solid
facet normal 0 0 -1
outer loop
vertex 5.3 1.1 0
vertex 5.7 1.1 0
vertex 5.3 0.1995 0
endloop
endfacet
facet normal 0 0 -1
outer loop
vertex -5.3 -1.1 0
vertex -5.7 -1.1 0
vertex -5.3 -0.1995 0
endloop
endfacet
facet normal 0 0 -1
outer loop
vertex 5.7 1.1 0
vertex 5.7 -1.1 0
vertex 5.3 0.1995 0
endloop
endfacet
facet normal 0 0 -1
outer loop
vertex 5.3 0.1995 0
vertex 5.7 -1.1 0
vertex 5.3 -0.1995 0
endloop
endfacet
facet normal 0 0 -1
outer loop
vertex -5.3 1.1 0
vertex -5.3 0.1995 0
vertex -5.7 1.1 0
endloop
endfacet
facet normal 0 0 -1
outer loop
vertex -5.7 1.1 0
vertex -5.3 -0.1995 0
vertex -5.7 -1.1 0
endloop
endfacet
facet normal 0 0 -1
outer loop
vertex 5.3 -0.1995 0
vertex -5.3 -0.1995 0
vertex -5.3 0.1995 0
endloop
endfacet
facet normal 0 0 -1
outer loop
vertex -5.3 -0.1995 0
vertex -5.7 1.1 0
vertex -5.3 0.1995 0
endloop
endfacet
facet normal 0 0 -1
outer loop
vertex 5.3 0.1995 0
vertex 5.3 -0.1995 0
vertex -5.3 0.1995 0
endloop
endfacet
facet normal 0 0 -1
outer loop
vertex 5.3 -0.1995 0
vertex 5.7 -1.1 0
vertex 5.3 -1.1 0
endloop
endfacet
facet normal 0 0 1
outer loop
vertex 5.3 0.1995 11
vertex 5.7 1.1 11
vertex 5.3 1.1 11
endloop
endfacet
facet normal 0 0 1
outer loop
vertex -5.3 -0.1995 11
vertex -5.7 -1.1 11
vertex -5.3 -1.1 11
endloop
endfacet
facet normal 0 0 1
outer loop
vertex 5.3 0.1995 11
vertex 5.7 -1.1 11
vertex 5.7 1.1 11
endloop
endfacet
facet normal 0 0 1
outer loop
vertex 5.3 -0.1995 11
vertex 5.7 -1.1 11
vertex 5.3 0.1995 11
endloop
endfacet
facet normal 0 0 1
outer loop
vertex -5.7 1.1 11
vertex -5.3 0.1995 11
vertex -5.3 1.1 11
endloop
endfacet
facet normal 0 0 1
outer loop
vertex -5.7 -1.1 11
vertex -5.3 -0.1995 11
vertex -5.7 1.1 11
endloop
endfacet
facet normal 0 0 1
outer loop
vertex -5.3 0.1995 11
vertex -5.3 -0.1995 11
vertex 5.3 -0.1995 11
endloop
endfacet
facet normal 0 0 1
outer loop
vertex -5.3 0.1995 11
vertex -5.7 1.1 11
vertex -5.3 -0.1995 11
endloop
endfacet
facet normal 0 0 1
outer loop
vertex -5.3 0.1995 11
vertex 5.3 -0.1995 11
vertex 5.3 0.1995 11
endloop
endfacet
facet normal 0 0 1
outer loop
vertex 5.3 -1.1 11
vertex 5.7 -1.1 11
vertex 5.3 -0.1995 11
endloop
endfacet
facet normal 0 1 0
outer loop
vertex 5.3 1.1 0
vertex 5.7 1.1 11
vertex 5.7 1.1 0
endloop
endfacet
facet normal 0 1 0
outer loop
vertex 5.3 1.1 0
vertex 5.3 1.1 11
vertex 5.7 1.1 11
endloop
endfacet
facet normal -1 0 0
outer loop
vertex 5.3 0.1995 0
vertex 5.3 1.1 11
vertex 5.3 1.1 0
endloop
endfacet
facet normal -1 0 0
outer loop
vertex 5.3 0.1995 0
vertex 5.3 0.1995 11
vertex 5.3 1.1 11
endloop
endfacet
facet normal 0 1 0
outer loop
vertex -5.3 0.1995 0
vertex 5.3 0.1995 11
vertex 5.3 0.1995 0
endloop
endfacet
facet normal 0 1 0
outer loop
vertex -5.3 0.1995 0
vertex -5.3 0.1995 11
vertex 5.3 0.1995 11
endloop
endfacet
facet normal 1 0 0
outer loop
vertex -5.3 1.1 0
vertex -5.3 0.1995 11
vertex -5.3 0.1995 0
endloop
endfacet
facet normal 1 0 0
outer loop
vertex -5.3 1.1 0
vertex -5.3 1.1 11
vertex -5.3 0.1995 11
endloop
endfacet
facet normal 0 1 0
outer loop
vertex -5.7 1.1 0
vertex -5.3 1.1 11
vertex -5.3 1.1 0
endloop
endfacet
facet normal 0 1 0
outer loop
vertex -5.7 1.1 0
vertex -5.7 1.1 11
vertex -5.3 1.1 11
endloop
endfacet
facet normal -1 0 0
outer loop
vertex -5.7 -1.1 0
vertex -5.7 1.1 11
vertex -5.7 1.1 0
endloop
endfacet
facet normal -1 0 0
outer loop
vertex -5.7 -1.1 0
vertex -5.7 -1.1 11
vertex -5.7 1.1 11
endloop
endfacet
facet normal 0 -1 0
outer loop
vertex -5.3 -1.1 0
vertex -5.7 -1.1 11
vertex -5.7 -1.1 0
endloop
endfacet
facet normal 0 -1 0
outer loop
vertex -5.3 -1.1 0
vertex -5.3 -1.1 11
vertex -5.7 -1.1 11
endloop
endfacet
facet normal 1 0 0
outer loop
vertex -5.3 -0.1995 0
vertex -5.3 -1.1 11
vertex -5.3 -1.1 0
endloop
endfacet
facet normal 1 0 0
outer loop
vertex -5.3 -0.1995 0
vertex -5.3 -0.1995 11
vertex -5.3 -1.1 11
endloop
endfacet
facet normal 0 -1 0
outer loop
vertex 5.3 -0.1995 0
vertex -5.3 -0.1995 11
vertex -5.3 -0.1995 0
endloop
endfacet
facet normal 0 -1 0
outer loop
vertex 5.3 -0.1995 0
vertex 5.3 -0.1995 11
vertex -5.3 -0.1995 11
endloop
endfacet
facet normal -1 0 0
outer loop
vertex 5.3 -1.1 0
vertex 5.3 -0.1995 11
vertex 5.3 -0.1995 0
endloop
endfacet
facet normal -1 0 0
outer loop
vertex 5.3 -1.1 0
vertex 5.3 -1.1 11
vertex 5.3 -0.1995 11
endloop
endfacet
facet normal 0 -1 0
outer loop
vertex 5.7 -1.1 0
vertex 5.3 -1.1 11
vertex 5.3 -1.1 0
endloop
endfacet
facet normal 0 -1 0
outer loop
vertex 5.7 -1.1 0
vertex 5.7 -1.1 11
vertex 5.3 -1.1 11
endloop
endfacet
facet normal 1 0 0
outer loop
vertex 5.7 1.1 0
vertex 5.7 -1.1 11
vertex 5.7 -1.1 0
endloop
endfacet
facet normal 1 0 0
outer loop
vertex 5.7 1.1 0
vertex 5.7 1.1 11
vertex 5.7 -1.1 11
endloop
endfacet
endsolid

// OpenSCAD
thickness=0.4;
width=11.4;
height=2.2;
depth=11;
bissl=1/1000;
*linear_extrude(depth)difference() {
  square([width,height],center=true);
  translate([0,thickness/2]) square([width-2*thickness,height-thickness+bissl],center=true);
}
linear_extrude(depth)difference() {
  square([width,height],center=true);
  translate([0,height/2]) square([width-2*thickness,height-thickness+bissl],center=true);
  translate([0,-height/2]) square([width-2*thickness,height-thickness+bissl],center=true);
}
